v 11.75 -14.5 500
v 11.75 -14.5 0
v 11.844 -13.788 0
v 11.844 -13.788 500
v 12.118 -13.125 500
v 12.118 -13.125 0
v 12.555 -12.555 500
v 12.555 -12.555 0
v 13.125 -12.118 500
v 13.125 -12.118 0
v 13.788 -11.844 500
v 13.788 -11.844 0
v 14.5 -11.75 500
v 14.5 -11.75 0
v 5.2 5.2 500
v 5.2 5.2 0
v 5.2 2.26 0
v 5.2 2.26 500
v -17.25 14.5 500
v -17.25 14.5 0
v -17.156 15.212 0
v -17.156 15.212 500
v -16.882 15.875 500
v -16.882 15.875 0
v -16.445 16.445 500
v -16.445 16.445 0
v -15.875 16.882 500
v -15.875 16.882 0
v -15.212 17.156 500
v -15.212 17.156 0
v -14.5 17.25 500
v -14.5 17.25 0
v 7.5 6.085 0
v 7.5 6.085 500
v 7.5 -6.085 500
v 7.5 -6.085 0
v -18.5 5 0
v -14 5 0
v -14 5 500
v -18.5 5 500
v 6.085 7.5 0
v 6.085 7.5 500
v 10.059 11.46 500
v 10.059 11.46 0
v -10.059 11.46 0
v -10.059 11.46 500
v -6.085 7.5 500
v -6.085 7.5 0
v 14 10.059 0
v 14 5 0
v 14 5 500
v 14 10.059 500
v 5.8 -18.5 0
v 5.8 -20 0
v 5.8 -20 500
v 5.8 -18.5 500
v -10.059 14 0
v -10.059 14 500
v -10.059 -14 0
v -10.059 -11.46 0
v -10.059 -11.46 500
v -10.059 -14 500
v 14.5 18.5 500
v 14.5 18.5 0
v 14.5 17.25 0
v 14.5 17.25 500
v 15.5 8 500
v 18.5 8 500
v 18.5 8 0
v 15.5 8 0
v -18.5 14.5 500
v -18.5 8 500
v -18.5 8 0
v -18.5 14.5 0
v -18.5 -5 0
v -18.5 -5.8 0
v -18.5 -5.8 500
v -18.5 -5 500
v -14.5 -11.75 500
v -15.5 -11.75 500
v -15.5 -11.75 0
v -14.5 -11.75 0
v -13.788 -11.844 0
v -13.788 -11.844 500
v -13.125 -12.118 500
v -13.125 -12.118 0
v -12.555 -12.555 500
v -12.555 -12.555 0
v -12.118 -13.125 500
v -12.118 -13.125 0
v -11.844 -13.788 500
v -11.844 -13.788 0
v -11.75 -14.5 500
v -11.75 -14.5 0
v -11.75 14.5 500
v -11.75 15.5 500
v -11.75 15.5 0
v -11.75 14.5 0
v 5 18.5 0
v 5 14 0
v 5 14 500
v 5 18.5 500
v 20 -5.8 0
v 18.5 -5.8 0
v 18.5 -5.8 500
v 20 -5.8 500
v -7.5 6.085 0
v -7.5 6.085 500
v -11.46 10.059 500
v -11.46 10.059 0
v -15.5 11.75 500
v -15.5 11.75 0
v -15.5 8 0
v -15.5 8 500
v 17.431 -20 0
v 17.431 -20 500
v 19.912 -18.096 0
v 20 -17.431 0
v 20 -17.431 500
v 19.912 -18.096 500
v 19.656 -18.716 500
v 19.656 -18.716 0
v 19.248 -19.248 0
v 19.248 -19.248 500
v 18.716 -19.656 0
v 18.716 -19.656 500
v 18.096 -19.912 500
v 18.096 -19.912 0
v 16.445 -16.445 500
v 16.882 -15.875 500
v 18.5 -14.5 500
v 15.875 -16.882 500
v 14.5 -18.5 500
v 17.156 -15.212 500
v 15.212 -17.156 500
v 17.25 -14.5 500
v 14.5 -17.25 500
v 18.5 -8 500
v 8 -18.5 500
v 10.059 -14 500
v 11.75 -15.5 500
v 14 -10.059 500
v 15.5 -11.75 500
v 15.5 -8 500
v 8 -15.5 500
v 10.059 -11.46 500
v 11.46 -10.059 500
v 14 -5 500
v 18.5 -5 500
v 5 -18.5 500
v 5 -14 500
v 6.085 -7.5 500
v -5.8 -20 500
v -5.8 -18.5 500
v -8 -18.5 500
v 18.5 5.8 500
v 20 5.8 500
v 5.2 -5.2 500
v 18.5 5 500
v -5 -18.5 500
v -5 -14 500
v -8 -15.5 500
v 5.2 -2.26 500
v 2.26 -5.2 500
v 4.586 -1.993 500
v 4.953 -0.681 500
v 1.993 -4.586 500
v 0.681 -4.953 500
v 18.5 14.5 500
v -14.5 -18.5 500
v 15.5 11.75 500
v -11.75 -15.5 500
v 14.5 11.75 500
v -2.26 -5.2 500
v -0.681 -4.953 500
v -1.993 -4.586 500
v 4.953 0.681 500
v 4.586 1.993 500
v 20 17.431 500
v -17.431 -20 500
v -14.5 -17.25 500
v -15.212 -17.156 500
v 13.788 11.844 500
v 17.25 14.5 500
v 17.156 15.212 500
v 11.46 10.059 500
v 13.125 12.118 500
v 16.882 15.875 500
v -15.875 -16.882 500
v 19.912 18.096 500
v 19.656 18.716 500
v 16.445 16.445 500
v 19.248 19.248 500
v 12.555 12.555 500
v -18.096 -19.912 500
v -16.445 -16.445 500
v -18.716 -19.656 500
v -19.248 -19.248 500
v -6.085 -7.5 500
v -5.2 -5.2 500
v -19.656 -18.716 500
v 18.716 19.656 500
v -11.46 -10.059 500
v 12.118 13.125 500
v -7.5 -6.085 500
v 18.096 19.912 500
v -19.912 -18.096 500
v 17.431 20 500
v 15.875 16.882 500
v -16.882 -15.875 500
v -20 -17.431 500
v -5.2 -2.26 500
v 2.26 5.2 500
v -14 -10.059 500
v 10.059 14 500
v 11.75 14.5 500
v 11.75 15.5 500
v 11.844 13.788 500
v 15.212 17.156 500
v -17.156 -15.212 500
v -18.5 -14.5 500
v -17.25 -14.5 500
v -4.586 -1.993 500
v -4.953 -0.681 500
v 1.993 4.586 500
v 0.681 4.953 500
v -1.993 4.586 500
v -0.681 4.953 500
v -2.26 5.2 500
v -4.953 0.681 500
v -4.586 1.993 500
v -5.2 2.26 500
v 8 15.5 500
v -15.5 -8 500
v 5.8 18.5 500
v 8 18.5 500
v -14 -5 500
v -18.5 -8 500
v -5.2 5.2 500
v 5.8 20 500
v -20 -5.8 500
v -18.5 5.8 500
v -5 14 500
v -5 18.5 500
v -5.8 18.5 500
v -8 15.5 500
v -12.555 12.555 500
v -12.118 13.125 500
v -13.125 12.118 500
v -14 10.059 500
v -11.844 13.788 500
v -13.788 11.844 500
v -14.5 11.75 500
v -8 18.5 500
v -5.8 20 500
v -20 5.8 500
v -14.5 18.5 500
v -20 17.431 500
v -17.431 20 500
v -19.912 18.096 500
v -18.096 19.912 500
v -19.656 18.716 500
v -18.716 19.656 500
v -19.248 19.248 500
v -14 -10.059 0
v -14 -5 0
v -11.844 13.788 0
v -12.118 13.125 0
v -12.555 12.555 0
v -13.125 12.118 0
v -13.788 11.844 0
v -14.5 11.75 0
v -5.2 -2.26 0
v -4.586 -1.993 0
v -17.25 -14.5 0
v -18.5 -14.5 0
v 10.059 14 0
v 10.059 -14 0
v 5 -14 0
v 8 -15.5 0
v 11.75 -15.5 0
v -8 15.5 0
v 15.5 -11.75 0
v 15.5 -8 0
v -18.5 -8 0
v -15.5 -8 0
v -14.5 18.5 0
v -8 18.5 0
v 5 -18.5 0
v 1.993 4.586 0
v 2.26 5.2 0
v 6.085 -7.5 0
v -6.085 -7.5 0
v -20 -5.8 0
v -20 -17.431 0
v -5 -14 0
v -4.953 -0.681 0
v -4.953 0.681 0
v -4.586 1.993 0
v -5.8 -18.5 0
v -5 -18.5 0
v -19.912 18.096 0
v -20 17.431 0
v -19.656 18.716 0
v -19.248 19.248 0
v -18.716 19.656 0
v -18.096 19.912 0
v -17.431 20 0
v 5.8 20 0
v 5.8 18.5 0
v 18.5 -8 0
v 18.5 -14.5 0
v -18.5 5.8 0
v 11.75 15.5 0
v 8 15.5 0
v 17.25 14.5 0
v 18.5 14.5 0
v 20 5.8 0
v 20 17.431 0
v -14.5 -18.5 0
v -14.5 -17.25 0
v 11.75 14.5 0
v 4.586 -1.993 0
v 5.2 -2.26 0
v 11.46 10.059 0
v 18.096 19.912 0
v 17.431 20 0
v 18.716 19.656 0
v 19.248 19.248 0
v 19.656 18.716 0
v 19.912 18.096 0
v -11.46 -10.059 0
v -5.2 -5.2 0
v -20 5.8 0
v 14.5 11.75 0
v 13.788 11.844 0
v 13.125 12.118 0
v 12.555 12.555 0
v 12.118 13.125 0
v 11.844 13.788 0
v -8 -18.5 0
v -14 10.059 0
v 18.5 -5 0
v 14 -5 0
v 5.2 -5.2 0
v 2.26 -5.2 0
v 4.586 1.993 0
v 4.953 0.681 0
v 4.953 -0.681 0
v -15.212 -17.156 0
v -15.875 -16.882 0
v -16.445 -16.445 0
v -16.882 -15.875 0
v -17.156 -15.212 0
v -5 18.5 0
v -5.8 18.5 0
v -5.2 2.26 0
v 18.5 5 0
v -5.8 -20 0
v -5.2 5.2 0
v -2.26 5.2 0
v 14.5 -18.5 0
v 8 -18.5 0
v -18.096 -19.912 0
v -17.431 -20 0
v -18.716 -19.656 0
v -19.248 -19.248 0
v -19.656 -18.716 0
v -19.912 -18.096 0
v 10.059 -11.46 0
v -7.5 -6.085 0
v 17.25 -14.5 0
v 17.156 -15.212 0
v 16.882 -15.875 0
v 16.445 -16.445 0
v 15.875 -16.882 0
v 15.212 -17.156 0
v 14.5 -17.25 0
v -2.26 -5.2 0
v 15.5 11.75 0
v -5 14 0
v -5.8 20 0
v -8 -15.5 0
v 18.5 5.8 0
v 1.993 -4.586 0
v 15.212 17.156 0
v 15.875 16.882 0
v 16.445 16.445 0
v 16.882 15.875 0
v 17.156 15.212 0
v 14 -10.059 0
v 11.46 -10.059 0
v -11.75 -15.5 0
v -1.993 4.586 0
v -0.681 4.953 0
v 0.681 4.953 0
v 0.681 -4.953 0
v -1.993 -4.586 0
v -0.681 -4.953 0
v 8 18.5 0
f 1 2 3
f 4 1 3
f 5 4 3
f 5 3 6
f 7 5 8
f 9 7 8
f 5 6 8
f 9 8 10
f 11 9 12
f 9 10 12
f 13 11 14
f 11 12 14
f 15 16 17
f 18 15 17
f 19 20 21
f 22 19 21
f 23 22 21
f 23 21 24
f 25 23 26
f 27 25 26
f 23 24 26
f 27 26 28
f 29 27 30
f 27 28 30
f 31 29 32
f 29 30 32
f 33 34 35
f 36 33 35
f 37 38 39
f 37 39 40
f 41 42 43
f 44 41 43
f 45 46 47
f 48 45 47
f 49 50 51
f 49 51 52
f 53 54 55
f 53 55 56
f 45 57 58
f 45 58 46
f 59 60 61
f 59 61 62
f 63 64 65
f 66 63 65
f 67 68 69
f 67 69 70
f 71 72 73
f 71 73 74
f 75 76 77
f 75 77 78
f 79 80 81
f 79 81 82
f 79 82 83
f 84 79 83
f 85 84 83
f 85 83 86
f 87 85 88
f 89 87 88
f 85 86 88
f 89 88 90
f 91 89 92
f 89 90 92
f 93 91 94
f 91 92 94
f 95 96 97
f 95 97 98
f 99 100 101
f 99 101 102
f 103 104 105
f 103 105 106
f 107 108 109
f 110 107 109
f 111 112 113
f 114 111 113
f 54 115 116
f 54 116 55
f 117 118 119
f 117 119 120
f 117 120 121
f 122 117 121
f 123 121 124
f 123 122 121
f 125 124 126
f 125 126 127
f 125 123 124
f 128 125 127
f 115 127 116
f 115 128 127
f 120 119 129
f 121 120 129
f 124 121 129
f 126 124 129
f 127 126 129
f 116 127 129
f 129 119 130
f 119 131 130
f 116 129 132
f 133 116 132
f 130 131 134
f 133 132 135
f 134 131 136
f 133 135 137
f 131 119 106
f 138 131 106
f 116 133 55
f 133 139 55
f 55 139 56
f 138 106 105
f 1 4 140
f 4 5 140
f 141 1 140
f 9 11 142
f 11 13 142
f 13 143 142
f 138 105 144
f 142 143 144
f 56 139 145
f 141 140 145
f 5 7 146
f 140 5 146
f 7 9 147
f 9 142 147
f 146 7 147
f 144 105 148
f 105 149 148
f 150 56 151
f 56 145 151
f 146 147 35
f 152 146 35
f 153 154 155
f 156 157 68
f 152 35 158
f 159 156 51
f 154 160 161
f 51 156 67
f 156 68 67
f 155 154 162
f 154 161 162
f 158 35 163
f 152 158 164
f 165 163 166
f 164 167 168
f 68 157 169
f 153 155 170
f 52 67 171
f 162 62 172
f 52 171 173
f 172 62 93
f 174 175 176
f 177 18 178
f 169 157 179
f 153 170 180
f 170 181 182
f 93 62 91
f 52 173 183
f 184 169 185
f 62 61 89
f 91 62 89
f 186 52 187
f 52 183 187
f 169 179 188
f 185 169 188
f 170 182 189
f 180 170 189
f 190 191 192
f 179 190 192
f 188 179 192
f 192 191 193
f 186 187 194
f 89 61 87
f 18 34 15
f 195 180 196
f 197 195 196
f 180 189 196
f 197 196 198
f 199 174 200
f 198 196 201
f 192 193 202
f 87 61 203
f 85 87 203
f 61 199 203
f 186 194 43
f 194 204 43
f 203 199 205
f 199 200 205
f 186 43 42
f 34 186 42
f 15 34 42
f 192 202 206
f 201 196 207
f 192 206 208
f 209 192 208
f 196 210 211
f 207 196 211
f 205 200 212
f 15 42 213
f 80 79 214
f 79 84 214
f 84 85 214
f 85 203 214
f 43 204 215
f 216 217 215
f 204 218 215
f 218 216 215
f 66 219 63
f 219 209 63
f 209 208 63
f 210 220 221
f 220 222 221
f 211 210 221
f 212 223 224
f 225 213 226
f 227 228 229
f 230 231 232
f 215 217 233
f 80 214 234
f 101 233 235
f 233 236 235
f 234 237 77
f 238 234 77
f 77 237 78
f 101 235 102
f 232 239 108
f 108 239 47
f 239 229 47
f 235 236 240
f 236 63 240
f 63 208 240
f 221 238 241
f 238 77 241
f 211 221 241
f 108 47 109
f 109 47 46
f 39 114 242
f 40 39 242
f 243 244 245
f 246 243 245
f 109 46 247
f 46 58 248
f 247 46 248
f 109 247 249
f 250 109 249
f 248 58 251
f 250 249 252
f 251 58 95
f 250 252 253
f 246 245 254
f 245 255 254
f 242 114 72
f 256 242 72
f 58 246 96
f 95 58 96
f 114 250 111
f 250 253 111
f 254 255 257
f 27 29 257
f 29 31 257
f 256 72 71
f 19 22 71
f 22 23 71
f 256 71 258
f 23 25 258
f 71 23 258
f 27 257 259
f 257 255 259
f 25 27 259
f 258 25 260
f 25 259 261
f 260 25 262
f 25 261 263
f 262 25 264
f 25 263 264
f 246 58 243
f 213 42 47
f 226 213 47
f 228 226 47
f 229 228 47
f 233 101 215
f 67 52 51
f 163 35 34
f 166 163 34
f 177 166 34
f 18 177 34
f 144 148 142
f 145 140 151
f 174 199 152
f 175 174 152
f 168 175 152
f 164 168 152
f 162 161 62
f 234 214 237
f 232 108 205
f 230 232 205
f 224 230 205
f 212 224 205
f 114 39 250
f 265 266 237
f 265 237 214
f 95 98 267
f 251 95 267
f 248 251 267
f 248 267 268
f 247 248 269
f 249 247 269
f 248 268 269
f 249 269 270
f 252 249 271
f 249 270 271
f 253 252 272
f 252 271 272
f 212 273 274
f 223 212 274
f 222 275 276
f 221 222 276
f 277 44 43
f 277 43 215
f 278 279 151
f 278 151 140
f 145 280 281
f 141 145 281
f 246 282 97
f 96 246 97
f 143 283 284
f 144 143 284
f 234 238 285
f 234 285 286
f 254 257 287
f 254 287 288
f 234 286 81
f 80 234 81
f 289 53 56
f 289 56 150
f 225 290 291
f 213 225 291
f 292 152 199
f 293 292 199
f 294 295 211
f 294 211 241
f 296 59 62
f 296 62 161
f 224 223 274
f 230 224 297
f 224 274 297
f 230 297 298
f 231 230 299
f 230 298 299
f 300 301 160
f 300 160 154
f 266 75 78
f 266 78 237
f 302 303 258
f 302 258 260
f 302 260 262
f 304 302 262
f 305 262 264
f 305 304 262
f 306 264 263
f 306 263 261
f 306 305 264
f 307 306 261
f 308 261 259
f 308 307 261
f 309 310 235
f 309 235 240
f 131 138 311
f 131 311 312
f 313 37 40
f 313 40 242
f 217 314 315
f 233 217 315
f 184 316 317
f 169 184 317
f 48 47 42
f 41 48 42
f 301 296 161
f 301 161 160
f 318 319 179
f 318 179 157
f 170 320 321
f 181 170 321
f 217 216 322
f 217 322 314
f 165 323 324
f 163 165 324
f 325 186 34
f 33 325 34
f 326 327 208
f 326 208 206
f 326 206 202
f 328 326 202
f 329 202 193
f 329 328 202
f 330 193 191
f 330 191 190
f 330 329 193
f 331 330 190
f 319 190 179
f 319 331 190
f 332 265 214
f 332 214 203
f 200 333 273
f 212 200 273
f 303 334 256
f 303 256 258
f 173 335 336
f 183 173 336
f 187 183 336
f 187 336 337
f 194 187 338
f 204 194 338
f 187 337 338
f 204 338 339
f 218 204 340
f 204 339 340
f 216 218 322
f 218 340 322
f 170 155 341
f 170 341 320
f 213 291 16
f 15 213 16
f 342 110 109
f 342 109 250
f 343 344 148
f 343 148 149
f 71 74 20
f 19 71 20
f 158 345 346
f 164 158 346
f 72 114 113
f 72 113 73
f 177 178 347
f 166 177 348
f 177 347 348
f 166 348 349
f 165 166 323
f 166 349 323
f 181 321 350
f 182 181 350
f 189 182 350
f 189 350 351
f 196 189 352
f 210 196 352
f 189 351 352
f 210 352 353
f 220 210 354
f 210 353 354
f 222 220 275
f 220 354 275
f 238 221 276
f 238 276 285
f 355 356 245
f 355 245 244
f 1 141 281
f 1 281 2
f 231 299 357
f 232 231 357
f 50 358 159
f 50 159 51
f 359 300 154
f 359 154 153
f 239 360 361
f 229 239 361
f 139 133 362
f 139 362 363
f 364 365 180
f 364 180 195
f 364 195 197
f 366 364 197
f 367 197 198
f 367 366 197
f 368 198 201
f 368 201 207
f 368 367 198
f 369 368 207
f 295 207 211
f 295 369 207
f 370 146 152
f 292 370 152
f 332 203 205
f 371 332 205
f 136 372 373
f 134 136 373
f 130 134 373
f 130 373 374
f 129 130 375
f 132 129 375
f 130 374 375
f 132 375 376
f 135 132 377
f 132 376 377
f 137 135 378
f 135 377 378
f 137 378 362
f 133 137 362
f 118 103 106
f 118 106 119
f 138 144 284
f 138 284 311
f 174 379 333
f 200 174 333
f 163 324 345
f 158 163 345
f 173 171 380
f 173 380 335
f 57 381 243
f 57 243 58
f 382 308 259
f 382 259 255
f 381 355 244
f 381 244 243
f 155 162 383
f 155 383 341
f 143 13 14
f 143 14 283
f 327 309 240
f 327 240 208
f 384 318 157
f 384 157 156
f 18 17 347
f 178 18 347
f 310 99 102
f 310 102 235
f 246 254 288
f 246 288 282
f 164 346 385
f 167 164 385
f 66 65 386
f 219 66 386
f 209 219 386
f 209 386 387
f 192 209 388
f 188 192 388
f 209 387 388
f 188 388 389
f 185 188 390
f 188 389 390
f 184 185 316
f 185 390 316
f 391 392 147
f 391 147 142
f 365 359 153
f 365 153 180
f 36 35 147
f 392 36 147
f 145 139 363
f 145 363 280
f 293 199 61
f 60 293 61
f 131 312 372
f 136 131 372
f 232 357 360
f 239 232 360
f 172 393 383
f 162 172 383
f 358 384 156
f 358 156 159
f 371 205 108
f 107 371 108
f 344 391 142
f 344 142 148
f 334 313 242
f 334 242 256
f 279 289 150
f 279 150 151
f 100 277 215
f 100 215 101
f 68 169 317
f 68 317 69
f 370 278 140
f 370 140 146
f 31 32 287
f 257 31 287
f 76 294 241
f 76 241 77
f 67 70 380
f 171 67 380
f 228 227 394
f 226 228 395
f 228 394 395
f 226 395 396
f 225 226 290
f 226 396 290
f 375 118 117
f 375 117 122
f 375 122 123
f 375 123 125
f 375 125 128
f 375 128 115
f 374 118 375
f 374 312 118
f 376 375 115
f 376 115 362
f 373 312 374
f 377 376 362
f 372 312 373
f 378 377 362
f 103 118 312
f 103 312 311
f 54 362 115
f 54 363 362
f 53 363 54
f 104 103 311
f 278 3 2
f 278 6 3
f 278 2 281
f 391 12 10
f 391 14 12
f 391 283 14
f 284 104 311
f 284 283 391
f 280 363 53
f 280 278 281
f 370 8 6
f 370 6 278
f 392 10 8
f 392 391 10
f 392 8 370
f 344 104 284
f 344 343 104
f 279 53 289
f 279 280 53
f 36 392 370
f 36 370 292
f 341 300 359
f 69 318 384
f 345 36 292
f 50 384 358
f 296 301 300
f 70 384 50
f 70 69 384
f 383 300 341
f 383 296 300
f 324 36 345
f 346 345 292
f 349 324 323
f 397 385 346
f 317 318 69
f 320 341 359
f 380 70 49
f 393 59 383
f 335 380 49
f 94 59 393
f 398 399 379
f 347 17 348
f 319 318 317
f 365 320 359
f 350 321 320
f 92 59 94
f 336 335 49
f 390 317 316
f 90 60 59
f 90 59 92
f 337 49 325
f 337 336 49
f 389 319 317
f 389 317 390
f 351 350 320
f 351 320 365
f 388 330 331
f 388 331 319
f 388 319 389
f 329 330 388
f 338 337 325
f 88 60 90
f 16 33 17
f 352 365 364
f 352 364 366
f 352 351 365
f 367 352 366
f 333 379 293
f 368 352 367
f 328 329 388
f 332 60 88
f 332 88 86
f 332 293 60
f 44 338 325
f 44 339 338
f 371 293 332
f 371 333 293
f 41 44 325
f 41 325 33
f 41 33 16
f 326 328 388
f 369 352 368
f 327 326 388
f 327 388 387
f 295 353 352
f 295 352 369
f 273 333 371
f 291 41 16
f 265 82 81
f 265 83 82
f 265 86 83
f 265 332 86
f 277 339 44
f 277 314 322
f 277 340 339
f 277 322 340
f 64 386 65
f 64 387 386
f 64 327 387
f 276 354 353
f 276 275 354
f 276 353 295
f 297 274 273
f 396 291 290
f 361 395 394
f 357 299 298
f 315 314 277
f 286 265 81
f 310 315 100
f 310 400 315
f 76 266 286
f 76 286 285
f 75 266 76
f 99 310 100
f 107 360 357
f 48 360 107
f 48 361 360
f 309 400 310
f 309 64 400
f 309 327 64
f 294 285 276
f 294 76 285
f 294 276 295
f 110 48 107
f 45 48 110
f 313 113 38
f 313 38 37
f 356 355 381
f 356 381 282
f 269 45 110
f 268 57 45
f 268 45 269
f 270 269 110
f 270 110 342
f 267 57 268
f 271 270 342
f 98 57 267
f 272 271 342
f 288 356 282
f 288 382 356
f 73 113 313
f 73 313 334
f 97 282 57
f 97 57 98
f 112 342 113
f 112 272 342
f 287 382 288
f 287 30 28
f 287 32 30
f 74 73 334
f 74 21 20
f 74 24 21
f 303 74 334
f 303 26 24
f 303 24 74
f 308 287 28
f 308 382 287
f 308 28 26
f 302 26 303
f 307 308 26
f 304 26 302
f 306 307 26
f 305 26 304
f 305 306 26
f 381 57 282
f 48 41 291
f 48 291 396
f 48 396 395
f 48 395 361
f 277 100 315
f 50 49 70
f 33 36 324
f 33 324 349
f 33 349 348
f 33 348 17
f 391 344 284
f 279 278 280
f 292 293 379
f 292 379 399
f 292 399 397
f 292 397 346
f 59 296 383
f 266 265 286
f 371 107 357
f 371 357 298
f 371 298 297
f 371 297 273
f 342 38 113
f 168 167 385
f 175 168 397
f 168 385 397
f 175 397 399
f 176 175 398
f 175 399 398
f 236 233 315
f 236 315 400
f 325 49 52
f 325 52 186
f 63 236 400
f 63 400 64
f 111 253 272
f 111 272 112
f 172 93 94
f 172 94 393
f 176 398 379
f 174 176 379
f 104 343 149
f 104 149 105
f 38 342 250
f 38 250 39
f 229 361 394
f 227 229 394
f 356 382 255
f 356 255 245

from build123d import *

# Parameters (mm, degrees)
ESTRUSIONE_ESTRUSIONE1_DEPTH = 500


with BuildPart() as part:
    # Schizzo1 → Estrusione-Estrusione1 (new body)
    with BuildSketch(Plane.XY):
        with BuildLine():
            Line((-5, 18.5), (-5, 14))
            Line((-5, 14), (-10.058726211, 14))
            Line((-10.058726211, 14), (-10.058726211, 11.46))
            Line((-10.058726211, 11.46), (-6.085, 7.5))
            Line((-6.085, 7.5), (6.085, 7.5))
            Line((6.085, 7.5), (10.058726211, 11.46))
            Line((10.058726211, 11.46), (10.058726211, 14))
            Line((10.058726211, 14), (5, 14))
            Line((5, 14), (5, 18.5))
            Line((5, 18.5), (5.8, 18.5))
            Line((5.8, 18.5), (5.8, 20))
            Line((5.8, 20), (17.4314, 20))
            ThreePointArc((17.4314, 20), (19.247674478, 19.247674478), (20, 17.4314))
            Line((20, 17.4314), (20, 5.8))
            Line((20, 5.8), (18.5, 5.8))
            Line((18.5, 5.8), (18.5, 5))
            Line((18.5, 5), (14, 5))
            Line((14, 5), (14, 10.058726211))
            Line((14, 10.058726211), (11.46, 10.058726211))
            Line((11.46, 10.058726211), (7.5, 6.085))
            Line((7.5, 6.085), (7.5, -6.085))
            Line((7.5, -6.085), (11.46, -10.058726211))
            Line((11.46, -10.058726211), (14, -10.058726211))
            Line((14, -10.058726211), (14, -5))
            Line((14, -5), (18.5, -5))
            Line((18.5, -5), (18.5, -5.8))
            Line((18.5, -5.8), (20, -5.8))
            Line((20, -5.8), (20, -17.4314))
            ThreePointArc((20, -17.4314), (19.247674478, -19.247674478), (17.4314, -20))
            Line((17.4314, -20), (5.8, -20))
            Line((5.8, -20), (5.8, -18.5))
            Line((5.8, -18.5), (5, -18.5))
            Line((5, -18.5), (5, -14))
            Line((5, -14), (10.058726211, -14))
            Line((10.058726211, -14), (10.058726211, -11.46))
            Line((10.058726211, -11.46), (6.085, -7.5))
            Line((6.085, -7.5), (-6.085, -7.5))
            Line((-6.085, -7.5), (-10.058726211, -11.46))
            Line((-10.058726211, -11.46), (-10.058726211, -14))
            Line((-10.058726211, -14), (-5, -14))
            Line((-5, -14), (-5, -18.5))
            Line((-5, -18.5), (-5.8, -18.5))
            Line((-5.8, -18.5), (-5.8, -20))
            Line((-5.8, -20), (-17.4314, -20))
            ThreePointArc((-17.4314, -20), (-19.247674478, -19.247674478), (-20, -17.4314))
            Line((-20, -17.4314), (-20, -5.8))
            Line((-20, -5.8), (-18.5, -5.8))
            Line((-18.5, -5.8), (-18.5, -5))
            Line((-18.5, -5), (-14, -5))
            Line((-14, -5), (-14, -10.058726211))
            Line((-14, -10.058726211), (-11.46, -10.058726211))
            Line((-11.46, -10.058726211), (-7.5, -6.085))
            Line((-7.5, -6.085), (-7.5, 6.085))
            Line((-7.5, 6.085), (-11.46, 10.058726211))
            Line((-11.46, 10.058726211), (-14, 10.058726211))
            Line((-14, 10.058726211), (-14, 5))
            Line((-14, 5), (-18.5, 5))
            Line((-18.5, 5), (-18.5, 5.8))
            Line((-18.5, 5.8), (-20, 5.8))
            Line((-20, 5.8), (-20, 17.4314))
            ThreePointArc((-20, 17.4314), (-19.247674478, 19.247674478), (-17.4314, 20))
            Line((-17.4314, 20), (-5.8, 20))
            Line((-5.8, 20), (-5.8, 18.5))
            Line((-5.8, 18.5), (-5, 18.5))
        make_face()
        with BuildLine():
            Line((-5.2, 5.2), (-2.26, 5.2))
            Line((-2.26, 5.2), (-1.992985622, 4.585630634))
            ThreePointArc((-1.992985622, 4.585630634), (0, 5), (1.992985622, 4.585630634))
            Line((1.992985622, 4.585630634), (2.26, 5.2))
            Line((2.26, 5.2), (5.2, 5.2))
            Line((5.2, 5.2), (5.2, 2.26))
            Line((5.2, 2.26), (4.585630634, 1.992985622))
            ThreePointArc((4.585630634, 1.992985622), (5, 0), (4.585630634, -1.992985622))
            Line((4.585630634, -1.992985622), (5.2, -2.26))
            Line((5.2, -2.26), (5.2, -5.2))
            Line((5.2, -5.2), (2.26, -5.2))
            Line((2.26, -5.2), (1.992985622, -4.585630634))
            ThreePointArc((1.992985622, -4.585630634), (0, -5), (-1.992985622, -4.585630634))
            Line((-1.992985622, -4.585630634), (-2.26, -5.2))
            Line((-2.26, -5.2), (-5.2, -5.2))
            Line((-5.2, -5.2), (-5.2, -2.26))
            Line((-5.2, -2.26), (-4.585630634, -1.992985622))
            ThreePointArc((-4.585630634, -1.992985622), (-5, 0), (-4.585630634, 1.992985622))
            Line((-4.585630634, 1.992985622), (-5.2, 2.26))
            Line((-5.2, 2.26), (-5.2, 5.2))
        make_face(mode=Mode.SUBTRACT)
        with BuildLine():
            Line((-11.75, 15.5), (-11.75, 14.5))
            ThreePointArc((-11.75, 14.5), (-12.555456352, 12.555456352), (-14.5, 11.75))
            Line((-14.5, 11.75), (-15.5, 11.75))
            Line((-15.5, 11.75), (-15.5, 8))
            Line((-15.5, 8), (-18.5, 8))
            Line((-18.5, 8), (-18.5, 14.5))
            Line((-18.5, 14.5), (-17.25, 14.5))
            ThreePointArc((-17.25, 14.5), (-16.444543648, 16.444543648), (-14.5, 17.25))
            Line((-14.5, 17.25), (-14.5, 18.5))
            Line((-14.5, 18.5), (-8, 18.5))
            Line((-8, 18.5), (-8, 15.5))
            Line((-8, 15.5), (-11.75, 15.5))
        make_face(mode=Mode.SUBTRACT)
        with BuildLine():
            Line((15.5, 11.75), (14.5, 11.75))
            ThreePointArc((14.5, 11.75), (12.555456352, 12.555456352), (11.75, 14.5))
            Line((11.75, 14.5), (11.75, 15.5))
            Line((11.75, 15.5), (8, 15.5))
            Line((8, 15.5), (8, 18.5))
            Line((8, 18.5), (14.5, 18.5))
            Line((14.5, 18.5), (14.5, 17.25))
            ThreePointArc((14.5, 17.25), (16.444543648, 16.444543648), (17.25, 14.5))
            Line((17.25, 14.5), (18.5, 14.5))
            Line((18.5, 14.5), (18.5, 8))
            Line((18.5, 8), (15.5, 8))
            Line((15.5, 8), (15.5, 11.75))
        make_face(mode=Mode.SUBTRACT)
        with BuildLine():
            Line((11.75, -15.5), (11.75, -14.5))
            ThreePointArc((11.75, -14.5), (12.555456352, -12.555456352), (14.5, -11.75))
            Line((14.5, -11.75), (15.5, -11.75))
            Line((15.5, -11.75), (15.5, -8))
            Line((15.5, -8), (18.5, -8))
            Line((18.5, -8), (18.5, -14.5))
            Line((18.5, -14.5), (17.25, -14.5))
            ThreePointArc((17.25, -14.5), (16.444543648, -16.444543648), (14.5, -17.25))
            Line((14.5, -17.25), (14.5, -18.5))
            Line((14.5, -18.5), (8, -18.5))
            Line((8, -18.5), (8, -15.5))
            Line((8, -15.5), (11.75, -15.5))
        make_face(mode=Mode.SUBTRACT)
        with BuildLine():
            Line((-15.5, -11.75), (-14.5, -11.75))
            ThreePointArc((-14.5, -11.75), (-12.555456352, -12.555456352), (-11.75, -14.5))
            Line((-11.75, -14.5), (-11.75, -15.5))
            Line((-11.75, -15.5), (-8, -15.5))
            Line((-8, -15.5), (-8, -18.5))
            Line((-8, -18.5), (-14.5, -18.5))
            Line((-14.5, -18.5), (-14.5, -17.25))
            ThreePointArc((-14.5, -17.25), (-16.444543648, -16.444543648), (-17.25, -14.5))
            Line((-17.25, -14.5), (-18.5, -14.5))
            Line((-18.5, -14.5), (-18.5, -8))
            Line((-18.5, -8), (-15.5, -8))
            Line((-15.5, -8), (-15.5, -11.75))
        make_face(mode=Mode.SUBTRACT)
    extrude(amount=ESTRUSIONE_ESTRUSIONE1_DEPTH)


solid = part.part
